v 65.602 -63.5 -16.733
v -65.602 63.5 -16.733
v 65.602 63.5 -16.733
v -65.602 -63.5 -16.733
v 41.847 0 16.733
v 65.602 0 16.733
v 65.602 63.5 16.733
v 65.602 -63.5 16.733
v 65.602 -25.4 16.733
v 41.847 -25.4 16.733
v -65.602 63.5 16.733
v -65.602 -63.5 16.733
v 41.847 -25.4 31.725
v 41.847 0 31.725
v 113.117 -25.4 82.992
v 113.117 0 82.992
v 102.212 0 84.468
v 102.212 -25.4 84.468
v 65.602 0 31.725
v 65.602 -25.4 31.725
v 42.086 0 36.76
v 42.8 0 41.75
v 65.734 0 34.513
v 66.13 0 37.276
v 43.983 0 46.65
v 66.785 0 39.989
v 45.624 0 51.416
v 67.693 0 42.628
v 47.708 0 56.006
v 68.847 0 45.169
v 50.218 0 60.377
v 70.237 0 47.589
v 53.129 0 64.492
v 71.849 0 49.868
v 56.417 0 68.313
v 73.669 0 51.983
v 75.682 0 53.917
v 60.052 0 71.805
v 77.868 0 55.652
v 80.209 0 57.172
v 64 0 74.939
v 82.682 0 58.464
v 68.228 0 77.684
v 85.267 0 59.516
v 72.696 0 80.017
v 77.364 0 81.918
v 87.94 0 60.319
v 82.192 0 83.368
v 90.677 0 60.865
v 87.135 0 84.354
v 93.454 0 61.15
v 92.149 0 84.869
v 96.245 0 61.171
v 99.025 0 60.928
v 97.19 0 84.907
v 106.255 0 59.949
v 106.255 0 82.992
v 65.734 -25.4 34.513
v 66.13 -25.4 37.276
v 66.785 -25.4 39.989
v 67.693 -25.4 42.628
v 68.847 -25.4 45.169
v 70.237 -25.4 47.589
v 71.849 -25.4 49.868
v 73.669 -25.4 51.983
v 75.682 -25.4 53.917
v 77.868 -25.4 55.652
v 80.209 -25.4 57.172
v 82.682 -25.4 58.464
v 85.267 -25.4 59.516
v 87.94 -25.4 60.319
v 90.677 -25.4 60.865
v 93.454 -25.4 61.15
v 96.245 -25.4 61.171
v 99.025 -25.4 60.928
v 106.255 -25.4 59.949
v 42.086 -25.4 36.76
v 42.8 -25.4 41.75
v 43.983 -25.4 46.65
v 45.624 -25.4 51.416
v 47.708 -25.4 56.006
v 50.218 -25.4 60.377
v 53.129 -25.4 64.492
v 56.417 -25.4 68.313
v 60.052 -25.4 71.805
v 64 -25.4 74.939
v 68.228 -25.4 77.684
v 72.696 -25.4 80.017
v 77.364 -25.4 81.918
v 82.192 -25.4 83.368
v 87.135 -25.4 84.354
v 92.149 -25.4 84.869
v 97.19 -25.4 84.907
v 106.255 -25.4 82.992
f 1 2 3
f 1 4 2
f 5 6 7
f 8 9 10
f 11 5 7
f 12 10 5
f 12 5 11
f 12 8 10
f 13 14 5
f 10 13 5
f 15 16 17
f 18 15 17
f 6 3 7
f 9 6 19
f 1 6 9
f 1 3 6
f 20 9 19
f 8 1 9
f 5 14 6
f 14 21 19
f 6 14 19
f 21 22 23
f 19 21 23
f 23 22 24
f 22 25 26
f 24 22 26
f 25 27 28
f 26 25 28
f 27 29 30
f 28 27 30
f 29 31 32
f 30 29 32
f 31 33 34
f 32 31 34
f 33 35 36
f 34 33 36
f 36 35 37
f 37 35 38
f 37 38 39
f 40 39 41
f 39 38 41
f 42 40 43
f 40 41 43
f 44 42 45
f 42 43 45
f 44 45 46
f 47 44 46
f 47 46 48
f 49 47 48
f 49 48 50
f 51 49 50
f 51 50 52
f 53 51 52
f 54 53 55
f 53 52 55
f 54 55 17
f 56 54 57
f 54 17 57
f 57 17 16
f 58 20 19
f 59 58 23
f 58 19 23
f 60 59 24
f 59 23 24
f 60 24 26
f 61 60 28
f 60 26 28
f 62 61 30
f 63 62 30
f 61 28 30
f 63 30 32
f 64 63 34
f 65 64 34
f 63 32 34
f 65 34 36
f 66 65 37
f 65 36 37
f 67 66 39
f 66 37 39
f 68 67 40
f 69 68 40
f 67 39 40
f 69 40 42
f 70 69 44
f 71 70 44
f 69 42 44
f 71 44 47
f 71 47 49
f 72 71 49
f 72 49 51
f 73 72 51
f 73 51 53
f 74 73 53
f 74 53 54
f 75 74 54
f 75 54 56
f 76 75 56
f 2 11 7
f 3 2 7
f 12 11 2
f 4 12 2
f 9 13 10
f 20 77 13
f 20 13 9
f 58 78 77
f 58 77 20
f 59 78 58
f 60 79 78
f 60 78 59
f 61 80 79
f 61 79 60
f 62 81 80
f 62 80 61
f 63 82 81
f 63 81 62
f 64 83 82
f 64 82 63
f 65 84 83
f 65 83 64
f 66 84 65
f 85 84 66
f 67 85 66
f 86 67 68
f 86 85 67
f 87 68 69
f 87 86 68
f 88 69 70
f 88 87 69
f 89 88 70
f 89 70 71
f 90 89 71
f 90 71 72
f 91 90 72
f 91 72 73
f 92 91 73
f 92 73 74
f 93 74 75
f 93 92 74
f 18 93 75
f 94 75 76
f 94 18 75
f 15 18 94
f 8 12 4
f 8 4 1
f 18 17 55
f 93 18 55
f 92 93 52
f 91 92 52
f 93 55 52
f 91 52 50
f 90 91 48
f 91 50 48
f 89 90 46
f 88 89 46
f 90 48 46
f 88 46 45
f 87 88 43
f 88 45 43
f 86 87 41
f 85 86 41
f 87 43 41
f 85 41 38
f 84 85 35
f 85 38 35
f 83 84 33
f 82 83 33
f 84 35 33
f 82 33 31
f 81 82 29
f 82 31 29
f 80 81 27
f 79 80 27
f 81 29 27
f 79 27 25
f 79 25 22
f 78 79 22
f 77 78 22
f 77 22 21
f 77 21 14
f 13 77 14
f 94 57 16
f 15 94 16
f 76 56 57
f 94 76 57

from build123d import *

# Parameters (mm, degrees)
F1_DEPTH = 63.5
F2_DEPTH = 25.4


with BuildPart() as f1:
    # F0 (on Front) → F1 (new body, symmetric)
    with BuildSketch(Plane.XZ):
        Polygon((65.602288, -16.733009), (65.602288, 16.733009), (41.847356, 16.733009), (-65.602288, 16.733009), (-65.602288, -16.733009), align=None)
    extrude(amount=F1_DEPTH, both=True)

    # F0 (on Front) → F2 (join)
    with BuildSketch(Plane.XZ):
        with BuildLine():
            Line((41.847356, 16.733009), (65.602288, 16.733009))
            Line((65.602288, 16.733009), (65.602288, 31.725151))
            ThreePointArc((65.602288, 31.725151), (75.681663, 53.916889), (99.024929, 60.928233))
            Line((99.024929, 60.928233), (106.255405, 59.949448))
            Line((106.255405, 59.949448), (106.255405, 82.992167))
            Line((106.255405, 82.992167), (113.11721, 82.992167))
            Line((113.11721, 82.992167), (102.211555, 84.468458))
            ThreePointArc((102.211555, 84.468458), (60.051584, 71.805361), (41.847356, 31.725151))
            Line((41.847356, 31.725151), (41.847356, 16.733009))
        make_face()
    extrude(amount=F2_DEPTH)


solid = f1.part
